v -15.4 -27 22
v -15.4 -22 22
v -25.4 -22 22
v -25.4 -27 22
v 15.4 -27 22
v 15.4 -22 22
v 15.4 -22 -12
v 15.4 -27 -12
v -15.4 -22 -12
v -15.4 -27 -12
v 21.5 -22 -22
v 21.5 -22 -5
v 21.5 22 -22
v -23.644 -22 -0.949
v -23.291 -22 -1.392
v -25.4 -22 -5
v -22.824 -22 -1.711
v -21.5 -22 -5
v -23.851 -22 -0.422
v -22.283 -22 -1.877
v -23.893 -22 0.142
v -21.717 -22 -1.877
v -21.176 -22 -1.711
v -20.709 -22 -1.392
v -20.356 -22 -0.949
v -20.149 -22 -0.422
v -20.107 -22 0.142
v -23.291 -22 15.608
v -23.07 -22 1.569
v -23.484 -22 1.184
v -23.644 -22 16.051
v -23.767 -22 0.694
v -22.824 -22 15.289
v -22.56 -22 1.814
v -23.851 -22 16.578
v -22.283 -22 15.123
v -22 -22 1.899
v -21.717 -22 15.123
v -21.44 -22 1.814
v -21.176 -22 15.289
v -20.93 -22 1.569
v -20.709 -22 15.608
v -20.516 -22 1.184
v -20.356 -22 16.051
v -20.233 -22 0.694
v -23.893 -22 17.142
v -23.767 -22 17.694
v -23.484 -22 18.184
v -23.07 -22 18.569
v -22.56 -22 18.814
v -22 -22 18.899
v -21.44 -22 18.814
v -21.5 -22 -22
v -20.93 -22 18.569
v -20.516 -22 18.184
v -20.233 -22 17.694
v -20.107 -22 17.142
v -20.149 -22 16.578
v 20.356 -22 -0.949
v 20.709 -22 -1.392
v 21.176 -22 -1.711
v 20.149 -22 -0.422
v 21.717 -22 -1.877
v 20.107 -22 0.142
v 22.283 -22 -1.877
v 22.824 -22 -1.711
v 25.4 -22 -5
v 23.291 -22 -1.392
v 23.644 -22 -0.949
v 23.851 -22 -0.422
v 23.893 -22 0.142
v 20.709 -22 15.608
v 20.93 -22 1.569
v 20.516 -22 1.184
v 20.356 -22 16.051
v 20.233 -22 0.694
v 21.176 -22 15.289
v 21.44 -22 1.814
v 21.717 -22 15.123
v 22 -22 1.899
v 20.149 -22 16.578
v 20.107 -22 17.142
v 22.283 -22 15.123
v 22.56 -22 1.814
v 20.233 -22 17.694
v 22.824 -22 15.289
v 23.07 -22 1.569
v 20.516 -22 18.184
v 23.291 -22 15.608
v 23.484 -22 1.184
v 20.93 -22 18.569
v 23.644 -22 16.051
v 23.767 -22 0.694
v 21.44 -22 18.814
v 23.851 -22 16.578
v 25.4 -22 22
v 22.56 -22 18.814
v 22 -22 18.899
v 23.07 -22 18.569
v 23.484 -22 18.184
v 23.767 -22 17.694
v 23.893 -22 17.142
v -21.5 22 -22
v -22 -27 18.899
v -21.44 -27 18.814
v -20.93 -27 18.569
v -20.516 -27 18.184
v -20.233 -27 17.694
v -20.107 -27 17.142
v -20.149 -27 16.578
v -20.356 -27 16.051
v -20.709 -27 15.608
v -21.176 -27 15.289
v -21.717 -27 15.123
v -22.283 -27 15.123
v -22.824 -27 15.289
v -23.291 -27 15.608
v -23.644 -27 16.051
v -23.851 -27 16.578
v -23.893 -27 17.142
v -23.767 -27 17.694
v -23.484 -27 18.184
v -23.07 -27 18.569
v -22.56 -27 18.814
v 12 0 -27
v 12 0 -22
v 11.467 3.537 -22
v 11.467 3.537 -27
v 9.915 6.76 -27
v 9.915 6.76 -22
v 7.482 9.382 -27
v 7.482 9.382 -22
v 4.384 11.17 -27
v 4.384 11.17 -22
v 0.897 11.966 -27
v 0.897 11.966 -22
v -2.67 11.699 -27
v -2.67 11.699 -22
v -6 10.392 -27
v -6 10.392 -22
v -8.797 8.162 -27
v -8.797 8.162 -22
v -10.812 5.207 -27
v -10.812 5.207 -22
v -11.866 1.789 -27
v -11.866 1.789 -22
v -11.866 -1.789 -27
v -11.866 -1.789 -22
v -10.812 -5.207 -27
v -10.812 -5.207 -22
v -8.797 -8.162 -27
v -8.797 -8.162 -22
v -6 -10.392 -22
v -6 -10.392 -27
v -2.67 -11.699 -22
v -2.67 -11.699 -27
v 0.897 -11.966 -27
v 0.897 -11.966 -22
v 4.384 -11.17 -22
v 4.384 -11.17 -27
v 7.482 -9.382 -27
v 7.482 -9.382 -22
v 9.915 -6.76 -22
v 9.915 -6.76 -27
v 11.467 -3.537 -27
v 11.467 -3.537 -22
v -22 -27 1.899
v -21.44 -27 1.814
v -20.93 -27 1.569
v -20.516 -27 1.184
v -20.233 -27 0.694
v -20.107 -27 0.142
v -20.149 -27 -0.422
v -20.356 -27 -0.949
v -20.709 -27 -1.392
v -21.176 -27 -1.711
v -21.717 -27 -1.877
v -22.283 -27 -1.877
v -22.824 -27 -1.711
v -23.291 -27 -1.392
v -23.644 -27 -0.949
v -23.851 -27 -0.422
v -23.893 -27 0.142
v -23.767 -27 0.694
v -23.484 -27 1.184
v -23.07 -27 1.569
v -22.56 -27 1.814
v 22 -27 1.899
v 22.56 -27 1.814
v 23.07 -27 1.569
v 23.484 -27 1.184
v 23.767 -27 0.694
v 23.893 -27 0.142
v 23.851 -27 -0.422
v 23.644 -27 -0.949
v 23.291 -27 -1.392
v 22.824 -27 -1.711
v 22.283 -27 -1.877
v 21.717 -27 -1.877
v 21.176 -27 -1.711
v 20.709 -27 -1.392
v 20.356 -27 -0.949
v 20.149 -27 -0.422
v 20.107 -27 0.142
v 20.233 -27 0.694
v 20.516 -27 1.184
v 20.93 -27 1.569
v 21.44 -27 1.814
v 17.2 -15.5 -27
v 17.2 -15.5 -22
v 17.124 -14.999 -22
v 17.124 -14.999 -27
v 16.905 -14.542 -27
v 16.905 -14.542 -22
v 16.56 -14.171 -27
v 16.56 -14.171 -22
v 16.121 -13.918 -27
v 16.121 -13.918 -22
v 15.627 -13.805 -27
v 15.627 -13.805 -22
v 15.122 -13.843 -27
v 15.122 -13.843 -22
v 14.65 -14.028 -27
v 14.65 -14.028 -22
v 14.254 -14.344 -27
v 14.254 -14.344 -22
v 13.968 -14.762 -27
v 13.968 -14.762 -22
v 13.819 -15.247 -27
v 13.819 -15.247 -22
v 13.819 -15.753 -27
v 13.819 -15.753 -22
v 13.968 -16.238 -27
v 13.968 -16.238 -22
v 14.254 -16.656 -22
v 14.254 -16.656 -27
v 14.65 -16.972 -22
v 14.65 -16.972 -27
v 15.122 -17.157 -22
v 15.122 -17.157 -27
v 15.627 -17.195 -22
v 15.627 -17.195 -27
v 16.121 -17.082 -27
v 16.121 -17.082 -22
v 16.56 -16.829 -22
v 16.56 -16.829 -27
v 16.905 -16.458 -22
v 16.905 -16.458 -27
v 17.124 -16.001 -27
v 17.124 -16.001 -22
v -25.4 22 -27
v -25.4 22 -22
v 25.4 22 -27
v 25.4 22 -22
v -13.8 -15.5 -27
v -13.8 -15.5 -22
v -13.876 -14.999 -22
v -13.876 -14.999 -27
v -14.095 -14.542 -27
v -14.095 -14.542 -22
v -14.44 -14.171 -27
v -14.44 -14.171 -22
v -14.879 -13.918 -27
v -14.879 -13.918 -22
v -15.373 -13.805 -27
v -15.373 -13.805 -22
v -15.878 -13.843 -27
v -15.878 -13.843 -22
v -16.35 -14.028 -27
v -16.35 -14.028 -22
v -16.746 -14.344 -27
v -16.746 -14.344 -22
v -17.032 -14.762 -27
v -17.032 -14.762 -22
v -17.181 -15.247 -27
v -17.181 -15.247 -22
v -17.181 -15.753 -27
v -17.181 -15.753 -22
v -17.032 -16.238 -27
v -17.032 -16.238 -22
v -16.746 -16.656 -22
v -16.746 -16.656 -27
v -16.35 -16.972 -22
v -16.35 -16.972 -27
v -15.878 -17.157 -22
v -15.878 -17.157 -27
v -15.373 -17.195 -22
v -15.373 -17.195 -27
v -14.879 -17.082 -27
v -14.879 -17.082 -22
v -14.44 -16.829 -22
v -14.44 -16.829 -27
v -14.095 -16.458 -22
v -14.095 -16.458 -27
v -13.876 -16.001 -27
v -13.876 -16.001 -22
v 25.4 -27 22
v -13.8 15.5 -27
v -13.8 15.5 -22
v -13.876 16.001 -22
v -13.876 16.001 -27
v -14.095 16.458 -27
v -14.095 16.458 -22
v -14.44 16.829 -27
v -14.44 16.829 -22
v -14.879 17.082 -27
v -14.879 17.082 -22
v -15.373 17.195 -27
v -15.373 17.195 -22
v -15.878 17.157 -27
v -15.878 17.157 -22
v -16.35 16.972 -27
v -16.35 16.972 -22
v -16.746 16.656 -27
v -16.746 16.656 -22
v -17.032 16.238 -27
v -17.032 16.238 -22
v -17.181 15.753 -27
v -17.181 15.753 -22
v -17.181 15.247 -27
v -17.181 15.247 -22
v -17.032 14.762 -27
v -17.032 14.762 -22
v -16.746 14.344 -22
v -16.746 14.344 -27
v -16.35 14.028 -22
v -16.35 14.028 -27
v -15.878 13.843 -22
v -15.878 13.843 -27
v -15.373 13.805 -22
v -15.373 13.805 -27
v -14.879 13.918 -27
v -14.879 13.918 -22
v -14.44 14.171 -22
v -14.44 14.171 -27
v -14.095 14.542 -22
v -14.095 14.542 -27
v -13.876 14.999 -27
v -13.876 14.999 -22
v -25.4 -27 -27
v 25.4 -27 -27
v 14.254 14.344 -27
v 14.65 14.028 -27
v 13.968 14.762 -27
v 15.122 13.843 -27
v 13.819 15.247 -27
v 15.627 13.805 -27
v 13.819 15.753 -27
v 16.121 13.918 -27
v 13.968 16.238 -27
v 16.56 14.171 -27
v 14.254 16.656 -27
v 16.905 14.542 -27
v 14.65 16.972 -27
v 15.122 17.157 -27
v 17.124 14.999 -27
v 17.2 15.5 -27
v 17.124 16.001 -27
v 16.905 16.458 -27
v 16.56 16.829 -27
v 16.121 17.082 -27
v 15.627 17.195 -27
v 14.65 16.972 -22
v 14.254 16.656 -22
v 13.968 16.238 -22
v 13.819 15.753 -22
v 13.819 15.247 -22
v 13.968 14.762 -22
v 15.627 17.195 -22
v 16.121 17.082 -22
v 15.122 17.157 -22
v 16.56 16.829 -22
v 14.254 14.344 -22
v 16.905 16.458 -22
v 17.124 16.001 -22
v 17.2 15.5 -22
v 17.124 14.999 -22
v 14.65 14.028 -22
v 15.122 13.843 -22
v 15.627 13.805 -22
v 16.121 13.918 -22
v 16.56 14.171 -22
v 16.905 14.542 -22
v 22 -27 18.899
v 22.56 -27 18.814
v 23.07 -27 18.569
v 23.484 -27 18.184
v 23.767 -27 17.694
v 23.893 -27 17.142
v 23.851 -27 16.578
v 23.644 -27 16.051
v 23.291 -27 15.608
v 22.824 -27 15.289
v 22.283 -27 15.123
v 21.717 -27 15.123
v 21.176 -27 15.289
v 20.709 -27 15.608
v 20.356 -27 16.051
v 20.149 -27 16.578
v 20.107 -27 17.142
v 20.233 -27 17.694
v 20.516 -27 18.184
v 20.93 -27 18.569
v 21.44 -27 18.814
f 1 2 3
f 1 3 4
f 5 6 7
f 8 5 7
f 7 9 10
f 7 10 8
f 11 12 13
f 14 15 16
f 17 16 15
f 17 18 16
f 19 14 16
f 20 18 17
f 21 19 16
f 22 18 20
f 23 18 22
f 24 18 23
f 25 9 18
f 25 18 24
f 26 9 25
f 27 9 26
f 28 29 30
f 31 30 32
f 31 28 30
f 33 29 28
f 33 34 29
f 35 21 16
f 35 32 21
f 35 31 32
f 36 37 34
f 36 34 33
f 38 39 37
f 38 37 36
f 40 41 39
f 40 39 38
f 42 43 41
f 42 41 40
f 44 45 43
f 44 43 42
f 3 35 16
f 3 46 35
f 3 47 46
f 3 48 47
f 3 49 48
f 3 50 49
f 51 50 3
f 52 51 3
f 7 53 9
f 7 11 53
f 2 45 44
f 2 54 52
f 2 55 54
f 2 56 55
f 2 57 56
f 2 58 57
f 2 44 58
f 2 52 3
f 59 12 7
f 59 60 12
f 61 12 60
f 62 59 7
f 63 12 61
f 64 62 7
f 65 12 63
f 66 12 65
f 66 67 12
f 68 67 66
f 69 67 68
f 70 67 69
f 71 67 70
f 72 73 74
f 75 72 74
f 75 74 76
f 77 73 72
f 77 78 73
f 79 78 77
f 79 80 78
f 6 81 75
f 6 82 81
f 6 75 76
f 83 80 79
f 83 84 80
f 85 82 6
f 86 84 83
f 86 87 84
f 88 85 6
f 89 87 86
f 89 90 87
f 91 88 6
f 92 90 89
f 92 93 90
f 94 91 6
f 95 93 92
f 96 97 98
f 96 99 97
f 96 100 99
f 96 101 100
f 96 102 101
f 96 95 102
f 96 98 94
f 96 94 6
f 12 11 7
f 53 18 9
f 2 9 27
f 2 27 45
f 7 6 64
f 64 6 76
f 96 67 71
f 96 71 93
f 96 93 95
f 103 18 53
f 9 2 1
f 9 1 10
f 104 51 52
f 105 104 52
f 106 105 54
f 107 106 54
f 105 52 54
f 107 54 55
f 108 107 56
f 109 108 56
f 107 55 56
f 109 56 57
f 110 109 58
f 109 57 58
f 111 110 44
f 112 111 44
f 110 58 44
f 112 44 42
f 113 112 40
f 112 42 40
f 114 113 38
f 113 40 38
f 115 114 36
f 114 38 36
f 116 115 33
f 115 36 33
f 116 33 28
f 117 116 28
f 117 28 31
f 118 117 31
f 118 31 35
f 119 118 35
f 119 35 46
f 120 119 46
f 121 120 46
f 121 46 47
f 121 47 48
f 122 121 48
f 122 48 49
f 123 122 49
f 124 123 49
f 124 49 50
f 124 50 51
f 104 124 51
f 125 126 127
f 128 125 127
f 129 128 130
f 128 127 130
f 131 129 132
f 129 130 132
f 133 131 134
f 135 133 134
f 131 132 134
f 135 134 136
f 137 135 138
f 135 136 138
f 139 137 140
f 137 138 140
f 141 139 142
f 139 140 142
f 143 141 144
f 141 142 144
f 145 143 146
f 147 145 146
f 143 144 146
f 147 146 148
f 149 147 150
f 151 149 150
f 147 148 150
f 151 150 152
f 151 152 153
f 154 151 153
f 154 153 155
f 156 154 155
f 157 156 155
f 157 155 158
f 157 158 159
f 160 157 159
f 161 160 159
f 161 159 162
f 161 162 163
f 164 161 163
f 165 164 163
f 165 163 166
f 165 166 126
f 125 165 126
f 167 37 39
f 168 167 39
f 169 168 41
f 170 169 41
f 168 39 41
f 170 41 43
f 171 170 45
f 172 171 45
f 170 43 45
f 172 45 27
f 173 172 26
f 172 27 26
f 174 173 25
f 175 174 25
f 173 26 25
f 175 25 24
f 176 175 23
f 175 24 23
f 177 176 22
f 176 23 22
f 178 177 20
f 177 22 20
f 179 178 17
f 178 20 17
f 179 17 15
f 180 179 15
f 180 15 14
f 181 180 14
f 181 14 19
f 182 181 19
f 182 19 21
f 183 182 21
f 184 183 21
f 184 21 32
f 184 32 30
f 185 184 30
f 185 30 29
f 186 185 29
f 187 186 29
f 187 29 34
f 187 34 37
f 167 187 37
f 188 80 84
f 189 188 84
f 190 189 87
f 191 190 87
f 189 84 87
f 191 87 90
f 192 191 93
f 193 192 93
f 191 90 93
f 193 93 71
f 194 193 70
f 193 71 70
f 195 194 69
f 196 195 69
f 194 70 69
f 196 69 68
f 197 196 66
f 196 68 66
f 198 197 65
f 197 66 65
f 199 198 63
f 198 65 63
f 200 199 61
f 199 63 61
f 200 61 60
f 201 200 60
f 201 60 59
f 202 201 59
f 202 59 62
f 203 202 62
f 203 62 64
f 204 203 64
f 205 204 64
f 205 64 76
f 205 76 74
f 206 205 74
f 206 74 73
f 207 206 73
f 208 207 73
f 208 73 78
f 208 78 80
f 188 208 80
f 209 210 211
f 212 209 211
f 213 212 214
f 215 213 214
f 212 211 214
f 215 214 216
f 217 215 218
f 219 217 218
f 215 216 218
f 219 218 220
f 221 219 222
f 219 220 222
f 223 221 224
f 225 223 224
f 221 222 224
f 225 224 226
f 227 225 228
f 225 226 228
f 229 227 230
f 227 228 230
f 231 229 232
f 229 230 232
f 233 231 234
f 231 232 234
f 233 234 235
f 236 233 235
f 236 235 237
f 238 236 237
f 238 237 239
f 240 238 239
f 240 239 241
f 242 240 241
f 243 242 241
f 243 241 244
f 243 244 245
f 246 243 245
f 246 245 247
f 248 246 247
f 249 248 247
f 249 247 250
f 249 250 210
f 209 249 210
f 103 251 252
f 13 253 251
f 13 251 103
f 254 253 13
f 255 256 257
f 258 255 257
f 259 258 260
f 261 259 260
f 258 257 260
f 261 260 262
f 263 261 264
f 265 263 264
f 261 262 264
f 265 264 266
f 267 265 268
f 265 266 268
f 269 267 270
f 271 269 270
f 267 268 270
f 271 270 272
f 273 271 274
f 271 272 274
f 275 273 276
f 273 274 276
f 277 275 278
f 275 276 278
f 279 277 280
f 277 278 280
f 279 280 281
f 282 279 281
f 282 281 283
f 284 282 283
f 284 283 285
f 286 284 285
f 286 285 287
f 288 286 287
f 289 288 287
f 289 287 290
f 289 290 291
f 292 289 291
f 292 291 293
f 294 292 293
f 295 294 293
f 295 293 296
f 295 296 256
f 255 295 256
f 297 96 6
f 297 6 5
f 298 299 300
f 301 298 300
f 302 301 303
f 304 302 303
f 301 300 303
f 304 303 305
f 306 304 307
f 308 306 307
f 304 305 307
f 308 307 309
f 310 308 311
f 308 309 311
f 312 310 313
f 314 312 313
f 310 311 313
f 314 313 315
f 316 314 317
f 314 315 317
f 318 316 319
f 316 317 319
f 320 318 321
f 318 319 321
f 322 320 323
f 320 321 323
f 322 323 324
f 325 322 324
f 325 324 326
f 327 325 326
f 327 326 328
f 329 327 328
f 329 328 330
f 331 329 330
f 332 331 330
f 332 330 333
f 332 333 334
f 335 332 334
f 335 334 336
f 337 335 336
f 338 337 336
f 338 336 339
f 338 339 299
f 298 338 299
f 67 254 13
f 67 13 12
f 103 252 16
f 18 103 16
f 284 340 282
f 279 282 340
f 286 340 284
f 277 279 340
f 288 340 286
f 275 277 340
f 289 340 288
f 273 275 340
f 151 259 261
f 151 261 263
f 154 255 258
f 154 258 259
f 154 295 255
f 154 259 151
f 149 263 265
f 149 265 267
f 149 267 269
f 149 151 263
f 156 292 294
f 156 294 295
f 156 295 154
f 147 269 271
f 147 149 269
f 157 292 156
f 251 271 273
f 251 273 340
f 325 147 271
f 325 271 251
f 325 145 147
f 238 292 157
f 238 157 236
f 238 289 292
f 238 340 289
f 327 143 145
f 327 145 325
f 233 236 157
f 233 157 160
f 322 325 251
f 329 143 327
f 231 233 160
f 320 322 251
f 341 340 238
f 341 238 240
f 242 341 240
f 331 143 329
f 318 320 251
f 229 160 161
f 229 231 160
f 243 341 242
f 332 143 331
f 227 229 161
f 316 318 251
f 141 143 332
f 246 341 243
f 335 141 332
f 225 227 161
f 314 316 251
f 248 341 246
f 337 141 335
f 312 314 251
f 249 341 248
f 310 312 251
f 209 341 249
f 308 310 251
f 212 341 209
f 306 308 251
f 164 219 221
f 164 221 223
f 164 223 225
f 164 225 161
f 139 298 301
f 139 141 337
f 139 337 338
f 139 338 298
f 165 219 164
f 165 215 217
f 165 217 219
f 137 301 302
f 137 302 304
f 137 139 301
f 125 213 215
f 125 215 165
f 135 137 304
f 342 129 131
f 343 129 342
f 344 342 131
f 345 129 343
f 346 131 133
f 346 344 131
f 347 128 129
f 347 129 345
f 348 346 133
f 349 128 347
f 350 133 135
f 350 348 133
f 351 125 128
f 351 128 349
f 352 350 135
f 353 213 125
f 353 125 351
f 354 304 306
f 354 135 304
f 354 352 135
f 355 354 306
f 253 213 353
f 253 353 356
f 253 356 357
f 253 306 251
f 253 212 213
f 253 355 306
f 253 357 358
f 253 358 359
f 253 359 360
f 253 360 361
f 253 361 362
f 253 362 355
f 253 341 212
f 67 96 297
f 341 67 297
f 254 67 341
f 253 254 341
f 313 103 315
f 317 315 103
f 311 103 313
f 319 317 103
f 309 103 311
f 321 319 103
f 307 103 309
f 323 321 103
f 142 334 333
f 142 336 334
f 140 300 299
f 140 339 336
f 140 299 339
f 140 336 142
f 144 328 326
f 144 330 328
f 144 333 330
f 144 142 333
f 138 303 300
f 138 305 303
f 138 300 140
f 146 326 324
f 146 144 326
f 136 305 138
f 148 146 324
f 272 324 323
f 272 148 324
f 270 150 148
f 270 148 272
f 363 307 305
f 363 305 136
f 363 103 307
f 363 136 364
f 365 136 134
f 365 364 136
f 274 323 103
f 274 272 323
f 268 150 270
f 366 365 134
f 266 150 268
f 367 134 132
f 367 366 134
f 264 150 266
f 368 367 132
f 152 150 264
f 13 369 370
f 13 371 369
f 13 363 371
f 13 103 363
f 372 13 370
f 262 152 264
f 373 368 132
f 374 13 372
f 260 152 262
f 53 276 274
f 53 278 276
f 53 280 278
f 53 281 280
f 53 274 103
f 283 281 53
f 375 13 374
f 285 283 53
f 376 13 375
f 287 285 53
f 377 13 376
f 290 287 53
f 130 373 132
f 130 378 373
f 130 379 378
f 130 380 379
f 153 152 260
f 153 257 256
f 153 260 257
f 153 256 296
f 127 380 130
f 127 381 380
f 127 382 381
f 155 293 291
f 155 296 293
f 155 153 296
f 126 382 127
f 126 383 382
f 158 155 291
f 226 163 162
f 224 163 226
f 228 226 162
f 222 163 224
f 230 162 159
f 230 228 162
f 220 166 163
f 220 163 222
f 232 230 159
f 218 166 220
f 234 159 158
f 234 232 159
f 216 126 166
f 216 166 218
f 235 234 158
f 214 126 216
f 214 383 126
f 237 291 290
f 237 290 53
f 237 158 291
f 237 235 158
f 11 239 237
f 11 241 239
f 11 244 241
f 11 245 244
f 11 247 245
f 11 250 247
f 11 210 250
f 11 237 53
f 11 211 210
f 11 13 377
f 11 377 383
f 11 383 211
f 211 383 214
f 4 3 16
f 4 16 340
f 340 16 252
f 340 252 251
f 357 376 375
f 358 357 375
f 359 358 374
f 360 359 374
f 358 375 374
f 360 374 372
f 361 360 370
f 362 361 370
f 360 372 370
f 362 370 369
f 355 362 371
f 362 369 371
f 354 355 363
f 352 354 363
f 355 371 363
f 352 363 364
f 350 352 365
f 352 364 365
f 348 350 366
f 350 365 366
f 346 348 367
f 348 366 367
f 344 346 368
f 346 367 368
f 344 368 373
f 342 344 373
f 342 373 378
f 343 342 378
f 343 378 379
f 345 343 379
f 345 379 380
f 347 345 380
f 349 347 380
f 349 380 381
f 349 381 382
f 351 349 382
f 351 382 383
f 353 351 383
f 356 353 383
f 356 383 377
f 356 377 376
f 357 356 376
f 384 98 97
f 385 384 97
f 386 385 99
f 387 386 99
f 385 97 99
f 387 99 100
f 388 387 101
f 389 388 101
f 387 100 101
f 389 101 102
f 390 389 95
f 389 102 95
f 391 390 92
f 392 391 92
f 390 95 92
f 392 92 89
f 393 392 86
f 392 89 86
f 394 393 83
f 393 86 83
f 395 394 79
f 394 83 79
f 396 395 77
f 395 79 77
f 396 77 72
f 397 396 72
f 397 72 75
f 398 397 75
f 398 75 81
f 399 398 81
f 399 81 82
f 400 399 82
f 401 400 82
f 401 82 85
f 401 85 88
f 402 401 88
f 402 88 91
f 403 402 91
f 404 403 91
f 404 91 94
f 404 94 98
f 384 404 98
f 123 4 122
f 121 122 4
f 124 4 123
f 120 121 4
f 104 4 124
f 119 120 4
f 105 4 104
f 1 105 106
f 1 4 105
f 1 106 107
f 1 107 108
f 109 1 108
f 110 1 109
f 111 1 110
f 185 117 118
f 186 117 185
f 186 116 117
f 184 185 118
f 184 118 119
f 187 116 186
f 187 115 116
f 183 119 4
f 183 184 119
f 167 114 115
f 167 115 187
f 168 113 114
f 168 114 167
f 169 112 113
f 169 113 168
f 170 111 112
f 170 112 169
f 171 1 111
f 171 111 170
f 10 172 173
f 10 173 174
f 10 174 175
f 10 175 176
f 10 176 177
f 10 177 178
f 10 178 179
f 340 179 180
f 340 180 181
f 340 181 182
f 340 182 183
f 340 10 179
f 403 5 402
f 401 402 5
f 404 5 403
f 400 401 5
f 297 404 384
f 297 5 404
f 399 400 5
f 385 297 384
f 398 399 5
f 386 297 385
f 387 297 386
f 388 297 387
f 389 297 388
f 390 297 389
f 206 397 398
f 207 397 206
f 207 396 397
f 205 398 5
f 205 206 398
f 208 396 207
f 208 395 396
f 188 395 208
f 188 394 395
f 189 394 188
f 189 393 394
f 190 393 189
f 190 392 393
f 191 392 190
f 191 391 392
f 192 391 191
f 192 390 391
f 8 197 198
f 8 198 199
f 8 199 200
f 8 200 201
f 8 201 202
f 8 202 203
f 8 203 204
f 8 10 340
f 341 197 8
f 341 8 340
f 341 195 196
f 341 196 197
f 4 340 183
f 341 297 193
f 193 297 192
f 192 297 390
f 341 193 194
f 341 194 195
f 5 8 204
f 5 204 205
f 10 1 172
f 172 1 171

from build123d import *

# Parameters (mm, degrees)
BOSS_EXTRUDE1_DEPTH = 25.4
SKETCH2_R           = 1.7
SKETCH2_R_2         = 12
CUT_EXTRUDE1_DEPTH  = 58.533989954
SKETCH4_W           = 30.8
SKETCH4_H           = 34
CUT_EXTRUDE2_DEPTH  = 58.533989954
SKETCH5_R           = 1.89865
CUT_EXTRUDE3_DEPTH  = 58.533989954
BOSS_EXTRUDE2_DEPTH = 3.9


with BuildPart() as part:
    # Sketch1 → Boss-Extrude1 (new, symmetric)
    with BuildSketch(Plane(origin=(0, 0, 0), x_dir=(0, 0, -1), z_dir=(1, 0, 0))):
        Polygon((-22, -22), (-22, -27), (27, -27), (27, 22), (22, 22), (22, -22), align=None)
    extrude(amount=BOSS_EXTRUDE1_DEPTH, both=True)

    # Sketch2 → Cut-Extrude1 (cut, through all)
    with BuildSketch(Plane.XY.offset(-22)):
        with Locations((-15.5, 15.5)):
            Circle(SKETCH2_R)
        with Locations((15.5, 15.5)):
            Circle(SKETCH2_R)
        with Locations((15.5, -15.5)):
            Circle(SKETCH2_R)
        with Locations((-15.5, -15.5)):
            Circle(SKETCH2_R)
        Circle(SKETCH2_R_2)
    extrude(amount=-CUT_EXTRUDE1_DEPTH, mode=Mode.SUBTRACT)

    # Sketch4 → Cut-Extrude2 (cut, through all)
    with BuildSketch(Plane(origin=(0, -22, 0), x_dir=(1, 0, 0), z_dir=(0, 1, 0))):
        with Locations((0, -5)):
            Rectangle(SKETCH4_W, SKETCH4_H)
    extrude(amount=-CUT_EXTRUDE2_DEPTH, mode=Mode.SUBTRACT)

    # Sketch5 → Cut-Extrude3 (cut, through all)
    with BuildSketch(Plane(origin=(0, -22, 0), x_dir=(1, 0, 0), z_dir=(0, 1, 0))):
        with Locations(Location((-22, 0, 0), (0, 0, 270))):
            Circle(SKETCH5_R)
        with Locations(Location((22, 0, 0), (0, 0, 270))):
            Circle(SKETCH5_R)
        with Locations(Location((22, -17, 0), (0, 0, 270))):
            Circle(SKETCH5_R)
        with Locations(Location((-22, -17, 0), (0, 0, 270))):
            Circle(SKETCH5_R)
    extrude(amount=-CUT_EXTRUDE3_DEPTH, mode=Mode.SUBTRACT)

    # Sketch6 → Boss-Extrude2 (add)
    with BuildSketch(Plane(origin=(25.4, 0, 0), x_dir=(0, 0, -1), z_dir=(1, 0, 0))):
        Polygon((22, 22), (5, -22), (22, -22), align=None)
    boss_extrude2 = extrude(amount=-BOSS_EXTRUDE2_DEPTH)

    # Mirror1: Boss-Extrude2 across plane
    add(boss_extrude2.mirror(Plane(origin=(0, 0, 0), x_dir=(0, 0, 1), z_dir=(1, 0, 0))))


solid = part.part
